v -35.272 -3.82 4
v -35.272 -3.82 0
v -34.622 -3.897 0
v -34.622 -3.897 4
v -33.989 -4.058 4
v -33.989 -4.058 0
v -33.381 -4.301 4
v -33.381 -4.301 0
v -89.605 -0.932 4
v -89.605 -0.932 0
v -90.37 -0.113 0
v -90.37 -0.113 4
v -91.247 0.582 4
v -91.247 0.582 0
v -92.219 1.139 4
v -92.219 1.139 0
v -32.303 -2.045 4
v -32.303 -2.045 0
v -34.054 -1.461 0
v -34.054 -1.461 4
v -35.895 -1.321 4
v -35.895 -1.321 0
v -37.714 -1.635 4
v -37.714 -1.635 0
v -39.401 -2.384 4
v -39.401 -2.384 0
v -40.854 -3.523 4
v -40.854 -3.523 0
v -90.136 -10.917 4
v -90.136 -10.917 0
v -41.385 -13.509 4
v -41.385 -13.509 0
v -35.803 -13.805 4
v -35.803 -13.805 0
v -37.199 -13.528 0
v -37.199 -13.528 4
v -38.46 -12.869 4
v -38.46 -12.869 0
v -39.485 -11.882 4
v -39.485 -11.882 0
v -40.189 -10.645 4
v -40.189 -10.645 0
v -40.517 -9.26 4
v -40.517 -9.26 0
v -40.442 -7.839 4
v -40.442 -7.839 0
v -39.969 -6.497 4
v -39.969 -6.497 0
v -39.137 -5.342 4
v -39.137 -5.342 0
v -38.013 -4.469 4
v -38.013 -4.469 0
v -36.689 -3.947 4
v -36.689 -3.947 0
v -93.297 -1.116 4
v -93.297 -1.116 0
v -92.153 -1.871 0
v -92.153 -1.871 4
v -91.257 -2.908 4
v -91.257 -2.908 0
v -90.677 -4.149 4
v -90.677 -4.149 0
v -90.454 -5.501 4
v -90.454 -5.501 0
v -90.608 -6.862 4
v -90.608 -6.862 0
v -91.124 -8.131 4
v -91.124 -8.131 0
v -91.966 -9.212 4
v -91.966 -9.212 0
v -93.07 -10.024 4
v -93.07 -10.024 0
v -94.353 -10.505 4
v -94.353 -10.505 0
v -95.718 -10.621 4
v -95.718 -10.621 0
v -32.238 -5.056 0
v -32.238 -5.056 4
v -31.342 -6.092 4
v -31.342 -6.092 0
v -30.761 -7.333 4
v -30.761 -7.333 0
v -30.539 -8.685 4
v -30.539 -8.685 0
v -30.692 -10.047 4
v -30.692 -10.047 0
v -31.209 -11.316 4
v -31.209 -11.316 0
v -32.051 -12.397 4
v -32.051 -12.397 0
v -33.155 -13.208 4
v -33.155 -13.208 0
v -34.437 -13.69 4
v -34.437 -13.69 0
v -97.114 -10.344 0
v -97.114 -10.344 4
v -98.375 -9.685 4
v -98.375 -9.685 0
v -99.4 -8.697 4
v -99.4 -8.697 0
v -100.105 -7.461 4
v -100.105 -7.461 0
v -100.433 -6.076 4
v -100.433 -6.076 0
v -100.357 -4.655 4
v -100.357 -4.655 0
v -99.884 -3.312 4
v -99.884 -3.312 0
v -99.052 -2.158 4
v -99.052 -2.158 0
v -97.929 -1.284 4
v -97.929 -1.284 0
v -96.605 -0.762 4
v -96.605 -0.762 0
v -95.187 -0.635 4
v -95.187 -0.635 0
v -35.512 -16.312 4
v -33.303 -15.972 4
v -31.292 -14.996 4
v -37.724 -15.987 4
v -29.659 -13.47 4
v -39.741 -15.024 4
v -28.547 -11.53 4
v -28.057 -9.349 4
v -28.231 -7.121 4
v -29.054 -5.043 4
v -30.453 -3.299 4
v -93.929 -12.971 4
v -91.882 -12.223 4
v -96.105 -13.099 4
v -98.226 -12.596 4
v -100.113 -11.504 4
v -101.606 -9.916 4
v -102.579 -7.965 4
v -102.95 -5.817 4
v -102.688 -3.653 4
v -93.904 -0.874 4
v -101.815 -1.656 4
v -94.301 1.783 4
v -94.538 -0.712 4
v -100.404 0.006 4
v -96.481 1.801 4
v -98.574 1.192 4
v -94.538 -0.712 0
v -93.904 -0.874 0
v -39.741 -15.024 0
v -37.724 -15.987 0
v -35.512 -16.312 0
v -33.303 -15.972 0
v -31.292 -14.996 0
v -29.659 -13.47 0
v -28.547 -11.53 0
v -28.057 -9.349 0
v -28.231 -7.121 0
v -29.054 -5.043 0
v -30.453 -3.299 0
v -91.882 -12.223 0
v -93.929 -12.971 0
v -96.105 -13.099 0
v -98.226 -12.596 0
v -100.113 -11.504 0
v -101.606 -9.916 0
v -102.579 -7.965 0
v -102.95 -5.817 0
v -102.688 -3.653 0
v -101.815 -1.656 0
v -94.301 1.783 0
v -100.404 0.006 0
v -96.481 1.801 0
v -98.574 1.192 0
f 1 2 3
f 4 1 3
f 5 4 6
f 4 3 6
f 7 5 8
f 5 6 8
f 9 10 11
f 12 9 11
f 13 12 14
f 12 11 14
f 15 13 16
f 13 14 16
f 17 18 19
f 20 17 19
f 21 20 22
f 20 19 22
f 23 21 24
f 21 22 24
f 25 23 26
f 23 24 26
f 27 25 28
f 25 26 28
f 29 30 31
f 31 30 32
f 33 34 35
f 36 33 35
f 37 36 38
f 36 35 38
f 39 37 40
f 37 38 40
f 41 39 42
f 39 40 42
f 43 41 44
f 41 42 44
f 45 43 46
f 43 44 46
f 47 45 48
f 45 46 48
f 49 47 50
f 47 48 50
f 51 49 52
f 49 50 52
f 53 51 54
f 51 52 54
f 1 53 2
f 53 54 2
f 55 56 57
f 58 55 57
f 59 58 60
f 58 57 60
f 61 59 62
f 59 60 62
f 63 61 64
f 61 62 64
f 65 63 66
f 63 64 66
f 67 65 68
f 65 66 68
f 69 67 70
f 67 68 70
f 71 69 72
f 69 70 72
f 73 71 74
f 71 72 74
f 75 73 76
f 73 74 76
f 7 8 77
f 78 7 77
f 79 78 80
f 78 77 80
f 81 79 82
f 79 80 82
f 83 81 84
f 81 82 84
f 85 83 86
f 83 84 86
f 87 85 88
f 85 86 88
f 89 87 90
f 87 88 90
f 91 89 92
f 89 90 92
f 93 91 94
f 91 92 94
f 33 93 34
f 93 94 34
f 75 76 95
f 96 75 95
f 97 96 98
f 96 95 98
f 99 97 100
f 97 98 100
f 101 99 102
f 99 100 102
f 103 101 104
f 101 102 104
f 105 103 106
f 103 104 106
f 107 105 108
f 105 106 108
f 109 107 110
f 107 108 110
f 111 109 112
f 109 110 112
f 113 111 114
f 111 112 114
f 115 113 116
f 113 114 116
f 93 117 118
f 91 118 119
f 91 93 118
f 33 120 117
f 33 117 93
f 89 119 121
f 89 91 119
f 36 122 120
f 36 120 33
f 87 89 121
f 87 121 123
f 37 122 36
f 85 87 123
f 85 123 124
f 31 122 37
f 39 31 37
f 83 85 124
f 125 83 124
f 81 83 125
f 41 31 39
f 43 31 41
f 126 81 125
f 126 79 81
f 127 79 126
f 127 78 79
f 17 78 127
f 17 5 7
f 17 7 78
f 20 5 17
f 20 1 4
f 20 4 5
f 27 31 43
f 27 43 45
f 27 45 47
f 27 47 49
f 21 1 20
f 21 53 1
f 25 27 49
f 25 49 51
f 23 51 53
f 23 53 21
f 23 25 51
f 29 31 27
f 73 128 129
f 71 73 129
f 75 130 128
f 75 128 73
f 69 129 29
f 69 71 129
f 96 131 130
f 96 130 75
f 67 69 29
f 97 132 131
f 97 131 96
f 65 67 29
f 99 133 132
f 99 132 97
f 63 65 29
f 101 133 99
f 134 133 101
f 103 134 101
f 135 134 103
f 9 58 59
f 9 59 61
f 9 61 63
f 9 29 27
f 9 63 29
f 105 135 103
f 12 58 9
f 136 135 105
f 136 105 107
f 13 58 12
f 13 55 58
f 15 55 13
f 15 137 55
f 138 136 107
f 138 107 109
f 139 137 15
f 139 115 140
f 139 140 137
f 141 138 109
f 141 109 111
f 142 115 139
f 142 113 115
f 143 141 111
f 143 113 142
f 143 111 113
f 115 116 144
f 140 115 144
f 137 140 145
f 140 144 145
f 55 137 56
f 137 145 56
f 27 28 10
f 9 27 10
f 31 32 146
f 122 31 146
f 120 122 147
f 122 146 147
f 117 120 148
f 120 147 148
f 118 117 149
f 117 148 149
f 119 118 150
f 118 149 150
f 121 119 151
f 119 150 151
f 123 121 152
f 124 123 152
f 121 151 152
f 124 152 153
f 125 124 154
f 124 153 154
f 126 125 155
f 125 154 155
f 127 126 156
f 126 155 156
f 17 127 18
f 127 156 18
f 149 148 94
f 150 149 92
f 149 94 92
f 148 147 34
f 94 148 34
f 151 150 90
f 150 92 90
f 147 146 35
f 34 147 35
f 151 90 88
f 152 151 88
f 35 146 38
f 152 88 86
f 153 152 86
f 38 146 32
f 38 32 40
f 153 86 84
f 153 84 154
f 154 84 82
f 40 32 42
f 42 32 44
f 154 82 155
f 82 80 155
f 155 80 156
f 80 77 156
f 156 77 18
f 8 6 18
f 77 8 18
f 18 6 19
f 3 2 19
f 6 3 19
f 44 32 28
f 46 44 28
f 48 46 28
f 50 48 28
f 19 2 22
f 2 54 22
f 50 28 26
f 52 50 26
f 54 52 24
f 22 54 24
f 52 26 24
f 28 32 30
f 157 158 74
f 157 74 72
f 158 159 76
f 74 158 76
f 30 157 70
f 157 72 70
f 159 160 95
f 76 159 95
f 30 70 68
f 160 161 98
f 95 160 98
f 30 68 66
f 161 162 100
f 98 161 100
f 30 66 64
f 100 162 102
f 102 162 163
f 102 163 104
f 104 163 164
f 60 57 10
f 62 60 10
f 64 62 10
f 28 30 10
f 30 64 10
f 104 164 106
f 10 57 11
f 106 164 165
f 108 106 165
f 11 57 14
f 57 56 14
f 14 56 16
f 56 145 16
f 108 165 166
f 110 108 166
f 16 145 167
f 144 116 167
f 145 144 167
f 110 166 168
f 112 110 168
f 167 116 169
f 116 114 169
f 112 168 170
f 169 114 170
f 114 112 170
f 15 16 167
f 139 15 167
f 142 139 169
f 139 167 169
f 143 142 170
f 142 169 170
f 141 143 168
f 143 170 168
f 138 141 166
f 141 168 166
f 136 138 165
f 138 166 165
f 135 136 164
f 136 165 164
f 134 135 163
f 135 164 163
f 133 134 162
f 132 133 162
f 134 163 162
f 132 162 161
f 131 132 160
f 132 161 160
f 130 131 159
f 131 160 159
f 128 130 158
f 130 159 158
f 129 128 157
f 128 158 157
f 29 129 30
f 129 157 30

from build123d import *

# Parameters (mm, degrees)
BOSS_EXTRUDE1_DEPTH = 4


with BuildPart() as part:
    # Sketch1 → Boss-Extrude1 (new body)
    with BuildSketch(Plane(origin=(0, 0, 0), x_dir=(0.431181775, 0.902265081, 0), z_dir=(0, 0, 1))):
        with BuildLine():
            ThreePointArc((-30.032895054, 31.515538639), (-26.144357712, 35.193408701), (-20.794099729, 35.342372963))
            Line((-20.794099729, 35.342372963), (-39.476574827, 80.445857725))
            ThreePointArc((-39.476574827, 80.445857725), (-43.365112169, 76.767987664), (-48.715370152, 76.619023401))
            Line((-48.715370152, 76.619023401), (-30.032895054, 31.515538639))
        make_face()
        with BuildLine():
            ThreePointArc((-48.715370152, 76.619023401), (-43.365112169, 76.767987664), (-39.476574827, 80.445857725))
            Line((-39.476574827, 80.445857725), (-41.615840249, 85.610501319))
            ThreePointArc((-41.615840249, 85.610501319), (-41.331311509, 84.672535768), (-41.235237911, 83.697084158))
            ThreePointArc((-41.235237911, 83.697084158), (-45.259786301, 78.793157756), (-50.854635574, 81.783666996))
            Line((-50.854635574, 81.783666996), (-48.715370152, 76.619023401))
        make_face()
        with BuildLine():
            Line((-41.615840249, 85.610501319), (-39.476574827, 80.445857725))
            ThreePointArc((-39.476574827, 80.445857725), (-38.922920456, 82.029746929), (-38.735237911, 83.697084158))
            ThreePointArc((-38.735237911, 83.697084158), (-50.573959393, 89.814722256), (-48.715370152, 76.619023401))
            Line((-48.715370152, 76.619023401), (-50.854635574, 81.783666996))
            ThreePointArc((-50.854635574, 81.783666996), (-48.148655073, 88.31648182), (-41.615840249, 85.610501319))
        make_face()
        with BuildLine():
            Line((-20.794099729, 35.342372963), (-18.654834307, 30.177729369))
            ThreePointArc((-18.654834307, 30.177729369), (-18.370305568, 29.239763817), (-18.27423197, 28.264312207))
            ThreePointArc((-18.27423197, 28.264312207), (-22.298780359, 23.360385805), (-27.893629632, 26.350895045))
            Line((-27.893629632, 26.350895045), (-30.032895054, 31.515538639))
            ThreePointArc((-30.032895054, 31.515538639), (-24.941569198, 20.951994752), (-15.77423197, 28.264312207))
            ThreePointArc((-15.77423197, 28.264312207), (-17.156593871, 32.603033689), (-20.794099729, 35.342372963))
        make_face()
        with BuildLine():
            ThreePointArc((-27.893629632, 26.350895045), (-25.187649131, 32.883709869), (-18.654834307, 30.177729369))
            Line((-18.654834307, 30.177729369), (-20.794099729, 35.342372963))
            ThreePointArc((-20.794099729, 35.342372963), (-26.144357712, 35.193408701), (-30.032895054, 31.515538639))
            Line((-30.032895054, 31.515538639), (-27.893629632, 26.350895045))
        make_face()
    extrude(amount=BOSS_EXTRUDE1_DEPTH)


solid = part.part
